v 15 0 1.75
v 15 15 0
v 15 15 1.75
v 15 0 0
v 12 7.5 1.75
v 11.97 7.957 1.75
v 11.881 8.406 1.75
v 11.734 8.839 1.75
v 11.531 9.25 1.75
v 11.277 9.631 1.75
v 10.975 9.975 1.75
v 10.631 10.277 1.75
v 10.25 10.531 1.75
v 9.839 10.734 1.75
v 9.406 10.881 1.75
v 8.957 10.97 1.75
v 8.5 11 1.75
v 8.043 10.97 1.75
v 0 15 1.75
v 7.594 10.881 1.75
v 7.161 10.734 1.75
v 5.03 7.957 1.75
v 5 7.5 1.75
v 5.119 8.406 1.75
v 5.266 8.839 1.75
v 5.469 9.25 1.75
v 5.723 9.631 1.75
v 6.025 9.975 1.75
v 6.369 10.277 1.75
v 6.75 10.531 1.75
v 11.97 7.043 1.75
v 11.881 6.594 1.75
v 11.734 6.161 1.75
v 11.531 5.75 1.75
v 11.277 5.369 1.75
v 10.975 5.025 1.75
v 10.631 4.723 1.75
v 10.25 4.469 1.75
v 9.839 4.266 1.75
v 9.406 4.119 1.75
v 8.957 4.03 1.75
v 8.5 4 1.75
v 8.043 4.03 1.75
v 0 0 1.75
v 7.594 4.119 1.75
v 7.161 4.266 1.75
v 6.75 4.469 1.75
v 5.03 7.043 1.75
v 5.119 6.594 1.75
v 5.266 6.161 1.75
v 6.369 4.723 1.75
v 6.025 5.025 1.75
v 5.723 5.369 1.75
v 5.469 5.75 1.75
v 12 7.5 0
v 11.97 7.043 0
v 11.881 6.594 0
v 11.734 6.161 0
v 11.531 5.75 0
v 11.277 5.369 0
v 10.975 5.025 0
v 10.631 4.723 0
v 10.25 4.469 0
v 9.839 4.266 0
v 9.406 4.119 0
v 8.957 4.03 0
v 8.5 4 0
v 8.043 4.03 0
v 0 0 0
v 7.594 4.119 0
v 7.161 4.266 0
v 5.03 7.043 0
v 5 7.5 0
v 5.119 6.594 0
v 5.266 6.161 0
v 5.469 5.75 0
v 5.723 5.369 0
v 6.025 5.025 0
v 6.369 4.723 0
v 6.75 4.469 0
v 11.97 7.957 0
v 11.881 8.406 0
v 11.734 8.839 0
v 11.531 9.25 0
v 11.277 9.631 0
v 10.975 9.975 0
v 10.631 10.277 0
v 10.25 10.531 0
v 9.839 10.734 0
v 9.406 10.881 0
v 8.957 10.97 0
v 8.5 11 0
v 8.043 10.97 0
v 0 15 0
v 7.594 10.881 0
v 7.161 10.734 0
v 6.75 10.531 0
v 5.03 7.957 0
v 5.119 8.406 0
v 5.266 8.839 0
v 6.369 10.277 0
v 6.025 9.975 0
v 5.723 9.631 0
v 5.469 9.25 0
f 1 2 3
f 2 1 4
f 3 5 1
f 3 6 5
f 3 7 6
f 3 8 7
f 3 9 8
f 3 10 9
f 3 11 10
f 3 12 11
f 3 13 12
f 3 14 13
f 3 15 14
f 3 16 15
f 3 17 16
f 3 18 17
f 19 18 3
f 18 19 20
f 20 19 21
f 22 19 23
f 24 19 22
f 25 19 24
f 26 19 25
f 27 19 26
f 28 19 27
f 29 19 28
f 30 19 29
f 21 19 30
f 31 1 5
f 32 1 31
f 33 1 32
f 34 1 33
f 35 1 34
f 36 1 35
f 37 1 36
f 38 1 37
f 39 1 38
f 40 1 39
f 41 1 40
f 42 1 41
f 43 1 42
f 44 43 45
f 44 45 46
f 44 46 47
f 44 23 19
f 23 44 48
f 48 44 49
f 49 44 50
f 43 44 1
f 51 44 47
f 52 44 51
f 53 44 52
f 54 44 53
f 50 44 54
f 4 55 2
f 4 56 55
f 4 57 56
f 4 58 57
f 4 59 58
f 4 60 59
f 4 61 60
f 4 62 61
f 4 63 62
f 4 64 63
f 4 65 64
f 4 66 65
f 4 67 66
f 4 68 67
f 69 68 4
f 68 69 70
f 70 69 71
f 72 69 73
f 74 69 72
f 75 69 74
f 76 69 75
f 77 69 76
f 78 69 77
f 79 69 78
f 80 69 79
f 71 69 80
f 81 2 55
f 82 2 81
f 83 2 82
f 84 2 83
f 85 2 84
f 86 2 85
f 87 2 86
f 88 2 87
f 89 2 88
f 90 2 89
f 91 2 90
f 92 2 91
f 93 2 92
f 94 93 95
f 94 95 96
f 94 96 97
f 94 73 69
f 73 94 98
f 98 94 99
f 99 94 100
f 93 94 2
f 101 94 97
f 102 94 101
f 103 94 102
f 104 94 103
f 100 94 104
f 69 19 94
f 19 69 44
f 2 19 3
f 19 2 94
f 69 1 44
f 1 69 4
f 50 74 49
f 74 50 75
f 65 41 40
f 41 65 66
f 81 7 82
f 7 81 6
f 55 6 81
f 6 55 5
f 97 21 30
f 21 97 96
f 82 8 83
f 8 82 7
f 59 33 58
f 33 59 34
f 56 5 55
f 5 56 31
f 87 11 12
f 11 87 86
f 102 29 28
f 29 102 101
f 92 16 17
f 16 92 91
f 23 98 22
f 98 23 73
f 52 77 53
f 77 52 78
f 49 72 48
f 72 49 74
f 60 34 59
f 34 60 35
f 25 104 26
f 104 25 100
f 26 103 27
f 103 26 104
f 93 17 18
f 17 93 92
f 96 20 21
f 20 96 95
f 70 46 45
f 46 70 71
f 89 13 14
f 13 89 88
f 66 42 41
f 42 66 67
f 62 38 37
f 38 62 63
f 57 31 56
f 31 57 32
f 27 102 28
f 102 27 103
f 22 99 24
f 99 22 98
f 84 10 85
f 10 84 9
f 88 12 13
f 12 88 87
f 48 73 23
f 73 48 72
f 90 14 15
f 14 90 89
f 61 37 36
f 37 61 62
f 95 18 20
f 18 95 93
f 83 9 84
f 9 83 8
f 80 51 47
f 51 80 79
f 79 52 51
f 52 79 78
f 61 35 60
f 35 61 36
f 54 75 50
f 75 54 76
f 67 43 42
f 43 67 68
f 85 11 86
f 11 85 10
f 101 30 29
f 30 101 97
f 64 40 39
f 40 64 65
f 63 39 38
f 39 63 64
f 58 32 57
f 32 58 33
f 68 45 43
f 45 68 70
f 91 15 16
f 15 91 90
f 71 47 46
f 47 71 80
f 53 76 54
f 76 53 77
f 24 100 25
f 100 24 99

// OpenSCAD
$fn = 48;

difference() {
	cube(size = [15, 15, 1.7500000000]);
	translate(v = [8.5000000000, 7.5000000000, -1]) {
		cylinder(d = 7, h = 10);
	}
}
/***********************************************
*********      SolidPython code:      **********
************************************************
 
#! /usr/bin/env python
# -*- coding: utf-8 -*-
from __future__ import division
import os
import sys

from solid import *
from solid.utils import *

SEGMENTS = 48

shim = (
    cube(size=[15, 15, 1.75]) - 
    translate([8.5, 7.5, -1])(cylinder(d=7, h=10))
)

if __name__ == '__main__':
    out_dir = sys.argv[1] if len(sys.argv) > 1 else os.curdir
    file_out = os.path.join(out_dir, 'shim.scad')
 
    a = shim

    print("%(__file__)s: SCAD file written to: \n%(file_out)s" % vars())

    # Adding the file_header argument as shown allows you to change
    # the detail of arcs by changing the SEGMENTS variable.  This can
    # be expensive when making lots of small curves, but is otherwise
    # useful.
    scad_render_to_file(a, file_out, file_header='$fn = %s;' % SEGMENTS) 
 
************************************************/
